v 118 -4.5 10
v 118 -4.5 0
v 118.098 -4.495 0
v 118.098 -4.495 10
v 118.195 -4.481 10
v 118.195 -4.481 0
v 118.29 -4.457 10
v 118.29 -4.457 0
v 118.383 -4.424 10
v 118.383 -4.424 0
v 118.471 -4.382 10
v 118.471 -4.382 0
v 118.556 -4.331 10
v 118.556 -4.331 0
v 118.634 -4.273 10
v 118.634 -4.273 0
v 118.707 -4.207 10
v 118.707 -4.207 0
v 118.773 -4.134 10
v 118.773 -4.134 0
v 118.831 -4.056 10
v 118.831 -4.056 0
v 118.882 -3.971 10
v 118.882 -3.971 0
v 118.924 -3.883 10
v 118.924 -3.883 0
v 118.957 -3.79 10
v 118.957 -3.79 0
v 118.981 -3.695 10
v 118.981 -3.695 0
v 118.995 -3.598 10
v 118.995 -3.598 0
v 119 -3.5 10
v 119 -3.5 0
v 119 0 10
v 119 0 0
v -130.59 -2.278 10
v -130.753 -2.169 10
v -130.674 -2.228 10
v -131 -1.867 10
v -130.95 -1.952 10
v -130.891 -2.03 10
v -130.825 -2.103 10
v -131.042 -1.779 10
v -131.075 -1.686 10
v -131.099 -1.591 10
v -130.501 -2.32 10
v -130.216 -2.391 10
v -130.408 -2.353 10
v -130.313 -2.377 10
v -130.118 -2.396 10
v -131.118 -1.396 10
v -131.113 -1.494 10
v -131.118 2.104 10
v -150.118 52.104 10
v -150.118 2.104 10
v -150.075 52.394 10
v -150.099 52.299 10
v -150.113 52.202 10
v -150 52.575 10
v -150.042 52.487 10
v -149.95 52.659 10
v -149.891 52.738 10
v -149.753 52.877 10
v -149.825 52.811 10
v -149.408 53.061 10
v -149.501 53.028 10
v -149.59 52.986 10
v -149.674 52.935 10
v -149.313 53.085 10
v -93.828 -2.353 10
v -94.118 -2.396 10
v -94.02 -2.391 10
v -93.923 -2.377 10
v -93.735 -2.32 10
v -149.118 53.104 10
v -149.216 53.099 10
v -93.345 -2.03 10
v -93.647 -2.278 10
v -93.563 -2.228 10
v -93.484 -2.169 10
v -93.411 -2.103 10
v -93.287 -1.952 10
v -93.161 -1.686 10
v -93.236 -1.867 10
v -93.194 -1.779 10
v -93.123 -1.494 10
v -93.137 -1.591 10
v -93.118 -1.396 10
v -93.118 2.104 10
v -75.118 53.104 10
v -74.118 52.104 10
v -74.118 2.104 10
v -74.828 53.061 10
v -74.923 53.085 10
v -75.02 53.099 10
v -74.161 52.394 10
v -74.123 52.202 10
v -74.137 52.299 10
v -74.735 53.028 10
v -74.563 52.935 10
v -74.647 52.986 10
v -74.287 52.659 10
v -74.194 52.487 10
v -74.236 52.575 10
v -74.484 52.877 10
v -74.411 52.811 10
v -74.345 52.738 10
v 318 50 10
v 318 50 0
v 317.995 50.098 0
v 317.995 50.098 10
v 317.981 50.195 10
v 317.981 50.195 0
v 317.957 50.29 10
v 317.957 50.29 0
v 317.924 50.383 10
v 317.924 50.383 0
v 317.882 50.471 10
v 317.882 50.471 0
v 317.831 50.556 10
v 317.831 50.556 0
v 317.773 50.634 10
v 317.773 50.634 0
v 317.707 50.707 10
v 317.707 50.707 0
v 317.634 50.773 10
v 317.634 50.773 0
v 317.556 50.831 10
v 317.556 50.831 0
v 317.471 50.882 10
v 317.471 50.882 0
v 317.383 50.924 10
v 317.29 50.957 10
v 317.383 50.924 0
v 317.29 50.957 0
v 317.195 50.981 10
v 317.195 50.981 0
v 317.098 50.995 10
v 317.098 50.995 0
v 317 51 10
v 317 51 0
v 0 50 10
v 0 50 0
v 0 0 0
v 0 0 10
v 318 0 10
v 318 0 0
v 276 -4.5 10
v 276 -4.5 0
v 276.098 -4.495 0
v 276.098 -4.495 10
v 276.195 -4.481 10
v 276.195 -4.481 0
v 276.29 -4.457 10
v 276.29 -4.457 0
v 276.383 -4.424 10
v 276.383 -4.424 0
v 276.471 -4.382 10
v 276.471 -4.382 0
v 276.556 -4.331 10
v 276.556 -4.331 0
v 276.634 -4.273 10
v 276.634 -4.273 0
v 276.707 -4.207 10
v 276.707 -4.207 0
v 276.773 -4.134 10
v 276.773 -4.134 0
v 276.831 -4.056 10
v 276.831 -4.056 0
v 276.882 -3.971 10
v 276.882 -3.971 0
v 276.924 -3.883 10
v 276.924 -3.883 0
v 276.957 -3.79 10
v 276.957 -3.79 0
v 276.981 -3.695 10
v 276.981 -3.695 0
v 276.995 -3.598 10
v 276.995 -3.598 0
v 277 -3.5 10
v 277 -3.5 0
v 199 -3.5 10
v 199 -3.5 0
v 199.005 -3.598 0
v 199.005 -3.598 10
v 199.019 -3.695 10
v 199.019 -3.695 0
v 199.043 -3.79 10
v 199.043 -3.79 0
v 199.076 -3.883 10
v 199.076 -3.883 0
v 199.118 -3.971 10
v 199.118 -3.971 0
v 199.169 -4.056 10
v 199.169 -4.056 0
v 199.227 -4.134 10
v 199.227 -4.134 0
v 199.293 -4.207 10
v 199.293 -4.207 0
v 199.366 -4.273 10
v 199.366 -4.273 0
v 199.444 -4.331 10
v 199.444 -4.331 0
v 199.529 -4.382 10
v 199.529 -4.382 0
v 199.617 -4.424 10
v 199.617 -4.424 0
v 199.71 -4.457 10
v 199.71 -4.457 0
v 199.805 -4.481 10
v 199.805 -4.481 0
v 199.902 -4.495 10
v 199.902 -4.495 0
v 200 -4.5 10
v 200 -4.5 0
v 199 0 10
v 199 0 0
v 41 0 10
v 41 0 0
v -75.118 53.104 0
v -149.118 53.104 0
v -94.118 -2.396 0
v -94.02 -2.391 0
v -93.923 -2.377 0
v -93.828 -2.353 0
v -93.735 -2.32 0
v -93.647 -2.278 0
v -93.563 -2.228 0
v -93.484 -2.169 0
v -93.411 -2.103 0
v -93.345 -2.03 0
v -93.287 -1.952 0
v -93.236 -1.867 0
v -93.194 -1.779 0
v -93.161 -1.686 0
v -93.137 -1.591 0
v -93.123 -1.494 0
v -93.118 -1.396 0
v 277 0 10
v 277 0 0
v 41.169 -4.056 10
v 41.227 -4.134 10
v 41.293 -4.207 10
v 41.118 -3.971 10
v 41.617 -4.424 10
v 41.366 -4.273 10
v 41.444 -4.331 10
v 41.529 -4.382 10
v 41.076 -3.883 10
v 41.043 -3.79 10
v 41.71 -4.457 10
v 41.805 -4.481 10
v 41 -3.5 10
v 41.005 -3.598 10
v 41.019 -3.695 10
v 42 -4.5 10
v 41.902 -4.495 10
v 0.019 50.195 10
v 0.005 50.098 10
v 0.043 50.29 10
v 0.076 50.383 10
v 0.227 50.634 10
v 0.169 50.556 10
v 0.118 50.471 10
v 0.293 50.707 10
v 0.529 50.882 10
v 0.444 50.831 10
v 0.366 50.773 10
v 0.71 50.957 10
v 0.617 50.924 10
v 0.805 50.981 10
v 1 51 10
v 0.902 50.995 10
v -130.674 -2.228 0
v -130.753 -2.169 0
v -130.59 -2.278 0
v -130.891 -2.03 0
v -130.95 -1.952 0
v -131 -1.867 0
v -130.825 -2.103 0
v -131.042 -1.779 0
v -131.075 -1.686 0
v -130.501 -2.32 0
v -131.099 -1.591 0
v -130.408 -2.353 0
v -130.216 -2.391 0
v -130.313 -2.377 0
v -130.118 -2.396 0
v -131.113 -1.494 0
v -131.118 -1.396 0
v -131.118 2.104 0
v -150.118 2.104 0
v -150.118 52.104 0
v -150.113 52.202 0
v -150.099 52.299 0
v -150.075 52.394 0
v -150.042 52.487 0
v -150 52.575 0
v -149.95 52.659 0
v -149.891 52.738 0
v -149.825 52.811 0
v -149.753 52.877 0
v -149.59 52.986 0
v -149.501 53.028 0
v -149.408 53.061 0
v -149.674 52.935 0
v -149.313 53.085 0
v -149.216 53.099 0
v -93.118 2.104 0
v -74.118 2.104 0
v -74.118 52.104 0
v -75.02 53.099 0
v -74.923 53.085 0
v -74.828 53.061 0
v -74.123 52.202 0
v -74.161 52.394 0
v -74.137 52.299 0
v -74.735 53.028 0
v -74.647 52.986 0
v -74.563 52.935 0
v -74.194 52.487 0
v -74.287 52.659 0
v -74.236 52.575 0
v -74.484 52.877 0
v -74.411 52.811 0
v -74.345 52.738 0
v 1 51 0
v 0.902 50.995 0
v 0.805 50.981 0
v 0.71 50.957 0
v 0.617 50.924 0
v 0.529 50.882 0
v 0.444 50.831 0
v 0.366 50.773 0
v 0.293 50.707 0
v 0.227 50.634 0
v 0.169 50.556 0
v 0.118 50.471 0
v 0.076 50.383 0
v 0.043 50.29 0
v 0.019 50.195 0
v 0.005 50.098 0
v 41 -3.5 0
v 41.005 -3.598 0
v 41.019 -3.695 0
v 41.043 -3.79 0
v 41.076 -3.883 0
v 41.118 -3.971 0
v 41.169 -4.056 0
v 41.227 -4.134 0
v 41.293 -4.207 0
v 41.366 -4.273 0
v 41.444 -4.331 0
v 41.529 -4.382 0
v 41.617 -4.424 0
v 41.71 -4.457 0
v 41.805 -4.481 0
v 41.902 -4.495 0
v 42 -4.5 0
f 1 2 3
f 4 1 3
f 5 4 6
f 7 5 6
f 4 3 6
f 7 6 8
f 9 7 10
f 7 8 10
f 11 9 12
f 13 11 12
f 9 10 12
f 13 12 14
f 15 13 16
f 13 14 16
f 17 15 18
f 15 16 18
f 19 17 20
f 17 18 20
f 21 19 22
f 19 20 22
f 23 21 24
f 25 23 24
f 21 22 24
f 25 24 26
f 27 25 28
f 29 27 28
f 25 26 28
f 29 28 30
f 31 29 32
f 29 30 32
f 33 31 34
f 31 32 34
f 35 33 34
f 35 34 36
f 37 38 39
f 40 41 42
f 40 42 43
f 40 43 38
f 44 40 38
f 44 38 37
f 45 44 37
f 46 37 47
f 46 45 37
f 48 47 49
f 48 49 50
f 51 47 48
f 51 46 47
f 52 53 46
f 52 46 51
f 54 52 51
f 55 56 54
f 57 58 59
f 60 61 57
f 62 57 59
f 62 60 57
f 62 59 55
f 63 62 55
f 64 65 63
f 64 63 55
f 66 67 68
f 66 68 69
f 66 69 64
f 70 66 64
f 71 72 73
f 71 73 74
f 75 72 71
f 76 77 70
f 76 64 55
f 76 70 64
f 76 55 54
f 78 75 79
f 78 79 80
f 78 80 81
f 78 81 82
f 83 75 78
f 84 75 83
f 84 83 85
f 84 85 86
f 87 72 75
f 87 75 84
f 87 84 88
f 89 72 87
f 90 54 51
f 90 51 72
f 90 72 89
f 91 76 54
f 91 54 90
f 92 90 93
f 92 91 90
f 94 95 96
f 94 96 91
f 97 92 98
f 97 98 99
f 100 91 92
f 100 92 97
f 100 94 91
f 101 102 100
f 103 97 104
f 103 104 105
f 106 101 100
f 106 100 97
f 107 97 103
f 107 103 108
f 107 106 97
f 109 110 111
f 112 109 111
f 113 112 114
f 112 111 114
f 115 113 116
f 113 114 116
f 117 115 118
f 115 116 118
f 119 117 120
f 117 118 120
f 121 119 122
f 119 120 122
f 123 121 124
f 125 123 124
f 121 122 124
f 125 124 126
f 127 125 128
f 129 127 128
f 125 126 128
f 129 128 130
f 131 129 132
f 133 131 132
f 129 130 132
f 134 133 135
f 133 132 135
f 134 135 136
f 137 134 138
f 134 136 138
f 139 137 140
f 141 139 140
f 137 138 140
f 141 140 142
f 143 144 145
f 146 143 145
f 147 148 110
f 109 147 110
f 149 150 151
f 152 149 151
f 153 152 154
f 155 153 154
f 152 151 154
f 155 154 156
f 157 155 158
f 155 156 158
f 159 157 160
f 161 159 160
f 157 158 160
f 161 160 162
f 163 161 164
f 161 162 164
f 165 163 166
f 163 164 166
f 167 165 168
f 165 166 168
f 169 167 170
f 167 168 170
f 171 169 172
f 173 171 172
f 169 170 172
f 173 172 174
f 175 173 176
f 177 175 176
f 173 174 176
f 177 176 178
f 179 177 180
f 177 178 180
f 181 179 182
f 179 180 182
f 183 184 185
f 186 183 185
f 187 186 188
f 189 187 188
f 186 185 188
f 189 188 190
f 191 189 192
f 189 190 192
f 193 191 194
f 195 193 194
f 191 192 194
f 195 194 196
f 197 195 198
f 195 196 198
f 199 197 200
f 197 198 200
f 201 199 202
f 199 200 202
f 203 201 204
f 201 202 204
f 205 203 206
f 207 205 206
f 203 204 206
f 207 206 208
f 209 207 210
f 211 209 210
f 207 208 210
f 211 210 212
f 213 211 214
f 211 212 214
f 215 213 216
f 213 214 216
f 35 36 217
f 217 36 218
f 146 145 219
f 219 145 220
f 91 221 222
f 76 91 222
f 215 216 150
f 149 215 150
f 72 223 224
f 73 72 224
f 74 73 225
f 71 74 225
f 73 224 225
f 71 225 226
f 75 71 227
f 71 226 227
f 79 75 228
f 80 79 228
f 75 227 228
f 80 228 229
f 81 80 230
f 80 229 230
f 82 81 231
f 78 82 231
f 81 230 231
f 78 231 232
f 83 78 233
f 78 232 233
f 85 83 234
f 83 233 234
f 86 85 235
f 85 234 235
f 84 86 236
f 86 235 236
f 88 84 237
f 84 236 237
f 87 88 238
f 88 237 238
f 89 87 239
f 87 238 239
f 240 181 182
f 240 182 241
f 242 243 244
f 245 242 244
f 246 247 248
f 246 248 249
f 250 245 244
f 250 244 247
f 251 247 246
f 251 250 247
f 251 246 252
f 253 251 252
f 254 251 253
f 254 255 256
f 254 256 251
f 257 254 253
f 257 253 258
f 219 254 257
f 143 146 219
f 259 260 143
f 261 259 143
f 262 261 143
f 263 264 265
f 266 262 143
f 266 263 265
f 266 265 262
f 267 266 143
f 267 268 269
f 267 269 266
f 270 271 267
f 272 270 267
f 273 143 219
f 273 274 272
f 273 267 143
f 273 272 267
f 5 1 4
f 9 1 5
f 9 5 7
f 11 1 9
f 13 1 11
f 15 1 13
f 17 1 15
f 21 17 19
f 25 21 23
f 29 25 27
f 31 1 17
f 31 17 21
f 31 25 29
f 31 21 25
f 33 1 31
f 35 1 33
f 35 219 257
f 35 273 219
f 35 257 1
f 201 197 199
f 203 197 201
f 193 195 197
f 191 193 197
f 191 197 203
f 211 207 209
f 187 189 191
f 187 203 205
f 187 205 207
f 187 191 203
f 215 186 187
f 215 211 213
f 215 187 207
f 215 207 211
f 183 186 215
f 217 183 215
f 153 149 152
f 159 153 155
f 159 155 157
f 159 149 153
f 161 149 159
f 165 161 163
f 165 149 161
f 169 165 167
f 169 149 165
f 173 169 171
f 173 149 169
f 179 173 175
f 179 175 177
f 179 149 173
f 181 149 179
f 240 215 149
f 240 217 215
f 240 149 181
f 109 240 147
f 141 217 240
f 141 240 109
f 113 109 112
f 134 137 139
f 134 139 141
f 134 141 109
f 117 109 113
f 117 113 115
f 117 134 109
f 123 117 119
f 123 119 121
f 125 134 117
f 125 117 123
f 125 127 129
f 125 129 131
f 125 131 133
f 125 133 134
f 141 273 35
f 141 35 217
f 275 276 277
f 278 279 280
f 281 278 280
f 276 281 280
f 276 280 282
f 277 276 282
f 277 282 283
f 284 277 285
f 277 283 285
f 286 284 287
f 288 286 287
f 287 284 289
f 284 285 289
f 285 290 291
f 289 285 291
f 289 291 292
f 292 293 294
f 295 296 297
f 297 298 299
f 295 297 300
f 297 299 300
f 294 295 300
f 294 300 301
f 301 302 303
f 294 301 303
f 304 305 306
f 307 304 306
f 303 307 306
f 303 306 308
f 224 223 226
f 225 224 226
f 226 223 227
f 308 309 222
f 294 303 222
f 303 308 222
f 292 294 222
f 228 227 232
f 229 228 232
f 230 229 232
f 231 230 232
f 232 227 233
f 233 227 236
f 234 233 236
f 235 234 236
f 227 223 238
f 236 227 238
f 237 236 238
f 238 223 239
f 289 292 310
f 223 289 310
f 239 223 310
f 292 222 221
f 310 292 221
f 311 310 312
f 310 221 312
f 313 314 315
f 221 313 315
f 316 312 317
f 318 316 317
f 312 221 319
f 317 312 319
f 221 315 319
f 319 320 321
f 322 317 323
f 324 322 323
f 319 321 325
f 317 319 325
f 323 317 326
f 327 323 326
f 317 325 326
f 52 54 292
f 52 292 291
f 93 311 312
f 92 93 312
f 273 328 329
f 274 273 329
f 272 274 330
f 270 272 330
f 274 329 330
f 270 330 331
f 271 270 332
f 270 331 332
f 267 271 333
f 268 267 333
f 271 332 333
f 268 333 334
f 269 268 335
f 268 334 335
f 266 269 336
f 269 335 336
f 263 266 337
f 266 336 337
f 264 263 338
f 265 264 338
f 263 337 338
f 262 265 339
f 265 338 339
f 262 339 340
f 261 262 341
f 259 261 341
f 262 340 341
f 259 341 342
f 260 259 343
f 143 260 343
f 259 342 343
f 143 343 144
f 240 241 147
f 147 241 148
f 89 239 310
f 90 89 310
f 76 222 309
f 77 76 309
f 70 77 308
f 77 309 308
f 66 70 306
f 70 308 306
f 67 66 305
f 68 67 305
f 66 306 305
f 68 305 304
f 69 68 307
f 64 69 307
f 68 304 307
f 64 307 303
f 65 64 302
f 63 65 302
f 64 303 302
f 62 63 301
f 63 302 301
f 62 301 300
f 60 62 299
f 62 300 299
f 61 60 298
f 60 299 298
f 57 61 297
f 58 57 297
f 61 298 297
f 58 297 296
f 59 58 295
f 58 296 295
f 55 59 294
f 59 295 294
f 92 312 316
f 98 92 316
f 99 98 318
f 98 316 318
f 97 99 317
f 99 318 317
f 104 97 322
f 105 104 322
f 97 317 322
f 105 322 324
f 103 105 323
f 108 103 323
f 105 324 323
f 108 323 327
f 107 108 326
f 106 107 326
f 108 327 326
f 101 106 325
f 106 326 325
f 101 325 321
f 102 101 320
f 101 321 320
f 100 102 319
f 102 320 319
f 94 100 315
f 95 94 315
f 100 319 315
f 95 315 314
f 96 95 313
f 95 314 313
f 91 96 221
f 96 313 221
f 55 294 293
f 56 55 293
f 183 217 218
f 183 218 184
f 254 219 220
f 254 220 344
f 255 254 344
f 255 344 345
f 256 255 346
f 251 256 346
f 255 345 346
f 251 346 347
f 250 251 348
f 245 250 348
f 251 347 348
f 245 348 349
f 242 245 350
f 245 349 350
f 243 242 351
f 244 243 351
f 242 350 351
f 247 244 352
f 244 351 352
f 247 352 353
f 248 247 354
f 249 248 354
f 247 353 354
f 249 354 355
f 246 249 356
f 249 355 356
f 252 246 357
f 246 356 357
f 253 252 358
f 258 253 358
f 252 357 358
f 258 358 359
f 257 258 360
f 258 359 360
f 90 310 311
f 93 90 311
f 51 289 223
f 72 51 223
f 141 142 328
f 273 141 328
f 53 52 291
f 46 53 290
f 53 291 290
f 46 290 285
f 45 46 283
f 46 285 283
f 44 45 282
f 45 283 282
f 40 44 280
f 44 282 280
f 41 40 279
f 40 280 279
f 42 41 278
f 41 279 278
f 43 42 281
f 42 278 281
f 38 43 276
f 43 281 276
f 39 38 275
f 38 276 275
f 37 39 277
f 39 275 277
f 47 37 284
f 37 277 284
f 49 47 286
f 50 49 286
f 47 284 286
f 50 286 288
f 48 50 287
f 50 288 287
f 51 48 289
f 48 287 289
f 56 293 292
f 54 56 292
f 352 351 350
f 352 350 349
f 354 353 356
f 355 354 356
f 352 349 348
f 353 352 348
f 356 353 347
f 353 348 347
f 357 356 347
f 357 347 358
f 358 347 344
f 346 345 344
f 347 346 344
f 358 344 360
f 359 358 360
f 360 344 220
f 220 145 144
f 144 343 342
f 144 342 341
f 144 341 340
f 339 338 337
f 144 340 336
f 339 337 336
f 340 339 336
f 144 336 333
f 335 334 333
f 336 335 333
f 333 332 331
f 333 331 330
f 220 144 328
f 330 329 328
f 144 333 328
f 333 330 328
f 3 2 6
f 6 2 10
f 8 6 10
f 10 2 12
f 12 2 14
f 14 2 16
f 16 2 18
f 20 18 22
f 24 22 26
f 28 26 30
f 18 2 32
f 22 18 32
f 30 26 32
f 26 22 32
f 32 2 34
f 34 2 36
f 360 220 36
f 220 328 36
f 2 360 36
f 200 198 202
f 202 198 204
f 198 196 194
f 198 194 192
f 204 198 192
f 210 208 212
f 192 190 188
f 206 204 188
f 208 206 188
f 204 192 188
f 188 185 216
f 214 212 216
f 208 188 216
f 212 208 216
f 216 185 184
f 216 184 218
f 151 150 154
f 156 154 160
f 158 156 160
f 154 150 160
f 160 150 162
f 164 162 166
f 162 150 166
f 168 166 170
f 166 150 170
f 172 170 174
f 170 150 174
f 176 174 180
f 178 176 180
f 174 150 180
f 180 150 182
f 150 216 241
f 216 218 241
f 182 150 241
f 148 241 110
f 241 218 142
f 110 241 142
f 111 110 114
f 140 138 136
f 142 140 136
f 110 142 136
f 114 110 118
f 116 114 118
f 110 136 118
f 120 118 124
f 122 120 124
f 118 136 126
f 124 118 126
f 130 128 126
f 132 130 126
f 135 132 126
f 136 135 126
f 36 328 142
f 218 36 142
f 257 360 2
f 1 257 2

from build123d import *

# Parameters (mm, degrees)
BOSS_EXTRUDE1_DEPTH   = 10
BOSS_EXTRUDE1_2_DEPTH = 10


with BuildPart() as part:
    # Sketch1 → Boss-Extrude1 (new body)
    with BuildSketch(Plane.XY):
        with BuildLine():
            Line((-93.118115932, 2.103915247), (-74.118115932, 2.103915247))
            Line((-74.118115932, 2.103915247), (-74.118115932, 52.103915247))
            ThreePointArc((-74.118115932, 52.103915247), (-74.411009151, 52.811022028), (-75.118115932, 53.103915247))
            Line((-75.118115932, 53.103915247), (-149.118115932, 53.103915247))
            ThreePointArc((-149.118115932, 53.103915247), (-149.825222713, 52.811022028), (-150.118115932, 52.103915247))
            Line((-150.118115932, 52.103915247), (-150.118115932, 2.103915247))
            Line((-150.118115932, 2.103915247), (-131.118115932, 2.103915247))
            Line((-131.118115932, 2.103915247), (-131.118115932, -1.396084753))
            ThreePointArc((-131.118115932, -1.396084753), (-130.825222713, -2.103191534), (-130.118115932, -2.396084753))
            Line((-130.118115932, -2.396084753), (-94.118115932, -2.396084753))
            ThreePointArc((-94.118115932, -2.396084753), (-93.411009151, -2.103191534), (-93.118115932, -1.396084753))
            Line((-93.118115932, -1.396084753), (-93.118115932, 2.103915247))
        make_face()
    extrude(amount=BOSS_EXTRUDE1_DEPTH)


with BuildPart() as body_2:
    # Sketch1 → Boss-Extrude1 2 (new body)
    with BuildSketch(Plane.XY):
        with BuildLine():
            Line((119, 0), (199, 0))
            Line((199, 0), (199, -3.5))
            ThreePointArc((199, -3.5), (199.292893219, -4.207106781), (200, -4.5))
            Line((200, -4.5), (276, -4.5))
            ThreePointArc((276, -4.5), (276.707106781, -4.207106781), (277, -3.5))
            Line((277, -3.5), (277, 0))
            Line((277, 0), (318, 0))
            Line((318, 0), (318, 50))
            ThreePointArc((318, 50), (317.707106781, 50.707106781), (317, 51))
            Line((317, 51), (1, 51))
            ThreePointArc((1, 51), (0.292893219, 50.707106781), (0, 50))
            Line((0, 50), (0, 0))
            Line((0, 0), (41, 0))
            Line((41, 0), (41, -3.5))
            ThreePointArc((41, -3.5), (41.292893219, -4.207106781), (42, -4.5))
            Line((42, -4.5), (118, -4.5))
            ThreePointArc((118, -4.5), (118.707106781, -4.207106781), (119, -3.5))
            Line((119, -3.5), (119, 0))
        make_face()
    extrude(amount=BOSS_EXTRUDE1_2_DEPTH)


solid = Compound([part.part, body_2.part])
